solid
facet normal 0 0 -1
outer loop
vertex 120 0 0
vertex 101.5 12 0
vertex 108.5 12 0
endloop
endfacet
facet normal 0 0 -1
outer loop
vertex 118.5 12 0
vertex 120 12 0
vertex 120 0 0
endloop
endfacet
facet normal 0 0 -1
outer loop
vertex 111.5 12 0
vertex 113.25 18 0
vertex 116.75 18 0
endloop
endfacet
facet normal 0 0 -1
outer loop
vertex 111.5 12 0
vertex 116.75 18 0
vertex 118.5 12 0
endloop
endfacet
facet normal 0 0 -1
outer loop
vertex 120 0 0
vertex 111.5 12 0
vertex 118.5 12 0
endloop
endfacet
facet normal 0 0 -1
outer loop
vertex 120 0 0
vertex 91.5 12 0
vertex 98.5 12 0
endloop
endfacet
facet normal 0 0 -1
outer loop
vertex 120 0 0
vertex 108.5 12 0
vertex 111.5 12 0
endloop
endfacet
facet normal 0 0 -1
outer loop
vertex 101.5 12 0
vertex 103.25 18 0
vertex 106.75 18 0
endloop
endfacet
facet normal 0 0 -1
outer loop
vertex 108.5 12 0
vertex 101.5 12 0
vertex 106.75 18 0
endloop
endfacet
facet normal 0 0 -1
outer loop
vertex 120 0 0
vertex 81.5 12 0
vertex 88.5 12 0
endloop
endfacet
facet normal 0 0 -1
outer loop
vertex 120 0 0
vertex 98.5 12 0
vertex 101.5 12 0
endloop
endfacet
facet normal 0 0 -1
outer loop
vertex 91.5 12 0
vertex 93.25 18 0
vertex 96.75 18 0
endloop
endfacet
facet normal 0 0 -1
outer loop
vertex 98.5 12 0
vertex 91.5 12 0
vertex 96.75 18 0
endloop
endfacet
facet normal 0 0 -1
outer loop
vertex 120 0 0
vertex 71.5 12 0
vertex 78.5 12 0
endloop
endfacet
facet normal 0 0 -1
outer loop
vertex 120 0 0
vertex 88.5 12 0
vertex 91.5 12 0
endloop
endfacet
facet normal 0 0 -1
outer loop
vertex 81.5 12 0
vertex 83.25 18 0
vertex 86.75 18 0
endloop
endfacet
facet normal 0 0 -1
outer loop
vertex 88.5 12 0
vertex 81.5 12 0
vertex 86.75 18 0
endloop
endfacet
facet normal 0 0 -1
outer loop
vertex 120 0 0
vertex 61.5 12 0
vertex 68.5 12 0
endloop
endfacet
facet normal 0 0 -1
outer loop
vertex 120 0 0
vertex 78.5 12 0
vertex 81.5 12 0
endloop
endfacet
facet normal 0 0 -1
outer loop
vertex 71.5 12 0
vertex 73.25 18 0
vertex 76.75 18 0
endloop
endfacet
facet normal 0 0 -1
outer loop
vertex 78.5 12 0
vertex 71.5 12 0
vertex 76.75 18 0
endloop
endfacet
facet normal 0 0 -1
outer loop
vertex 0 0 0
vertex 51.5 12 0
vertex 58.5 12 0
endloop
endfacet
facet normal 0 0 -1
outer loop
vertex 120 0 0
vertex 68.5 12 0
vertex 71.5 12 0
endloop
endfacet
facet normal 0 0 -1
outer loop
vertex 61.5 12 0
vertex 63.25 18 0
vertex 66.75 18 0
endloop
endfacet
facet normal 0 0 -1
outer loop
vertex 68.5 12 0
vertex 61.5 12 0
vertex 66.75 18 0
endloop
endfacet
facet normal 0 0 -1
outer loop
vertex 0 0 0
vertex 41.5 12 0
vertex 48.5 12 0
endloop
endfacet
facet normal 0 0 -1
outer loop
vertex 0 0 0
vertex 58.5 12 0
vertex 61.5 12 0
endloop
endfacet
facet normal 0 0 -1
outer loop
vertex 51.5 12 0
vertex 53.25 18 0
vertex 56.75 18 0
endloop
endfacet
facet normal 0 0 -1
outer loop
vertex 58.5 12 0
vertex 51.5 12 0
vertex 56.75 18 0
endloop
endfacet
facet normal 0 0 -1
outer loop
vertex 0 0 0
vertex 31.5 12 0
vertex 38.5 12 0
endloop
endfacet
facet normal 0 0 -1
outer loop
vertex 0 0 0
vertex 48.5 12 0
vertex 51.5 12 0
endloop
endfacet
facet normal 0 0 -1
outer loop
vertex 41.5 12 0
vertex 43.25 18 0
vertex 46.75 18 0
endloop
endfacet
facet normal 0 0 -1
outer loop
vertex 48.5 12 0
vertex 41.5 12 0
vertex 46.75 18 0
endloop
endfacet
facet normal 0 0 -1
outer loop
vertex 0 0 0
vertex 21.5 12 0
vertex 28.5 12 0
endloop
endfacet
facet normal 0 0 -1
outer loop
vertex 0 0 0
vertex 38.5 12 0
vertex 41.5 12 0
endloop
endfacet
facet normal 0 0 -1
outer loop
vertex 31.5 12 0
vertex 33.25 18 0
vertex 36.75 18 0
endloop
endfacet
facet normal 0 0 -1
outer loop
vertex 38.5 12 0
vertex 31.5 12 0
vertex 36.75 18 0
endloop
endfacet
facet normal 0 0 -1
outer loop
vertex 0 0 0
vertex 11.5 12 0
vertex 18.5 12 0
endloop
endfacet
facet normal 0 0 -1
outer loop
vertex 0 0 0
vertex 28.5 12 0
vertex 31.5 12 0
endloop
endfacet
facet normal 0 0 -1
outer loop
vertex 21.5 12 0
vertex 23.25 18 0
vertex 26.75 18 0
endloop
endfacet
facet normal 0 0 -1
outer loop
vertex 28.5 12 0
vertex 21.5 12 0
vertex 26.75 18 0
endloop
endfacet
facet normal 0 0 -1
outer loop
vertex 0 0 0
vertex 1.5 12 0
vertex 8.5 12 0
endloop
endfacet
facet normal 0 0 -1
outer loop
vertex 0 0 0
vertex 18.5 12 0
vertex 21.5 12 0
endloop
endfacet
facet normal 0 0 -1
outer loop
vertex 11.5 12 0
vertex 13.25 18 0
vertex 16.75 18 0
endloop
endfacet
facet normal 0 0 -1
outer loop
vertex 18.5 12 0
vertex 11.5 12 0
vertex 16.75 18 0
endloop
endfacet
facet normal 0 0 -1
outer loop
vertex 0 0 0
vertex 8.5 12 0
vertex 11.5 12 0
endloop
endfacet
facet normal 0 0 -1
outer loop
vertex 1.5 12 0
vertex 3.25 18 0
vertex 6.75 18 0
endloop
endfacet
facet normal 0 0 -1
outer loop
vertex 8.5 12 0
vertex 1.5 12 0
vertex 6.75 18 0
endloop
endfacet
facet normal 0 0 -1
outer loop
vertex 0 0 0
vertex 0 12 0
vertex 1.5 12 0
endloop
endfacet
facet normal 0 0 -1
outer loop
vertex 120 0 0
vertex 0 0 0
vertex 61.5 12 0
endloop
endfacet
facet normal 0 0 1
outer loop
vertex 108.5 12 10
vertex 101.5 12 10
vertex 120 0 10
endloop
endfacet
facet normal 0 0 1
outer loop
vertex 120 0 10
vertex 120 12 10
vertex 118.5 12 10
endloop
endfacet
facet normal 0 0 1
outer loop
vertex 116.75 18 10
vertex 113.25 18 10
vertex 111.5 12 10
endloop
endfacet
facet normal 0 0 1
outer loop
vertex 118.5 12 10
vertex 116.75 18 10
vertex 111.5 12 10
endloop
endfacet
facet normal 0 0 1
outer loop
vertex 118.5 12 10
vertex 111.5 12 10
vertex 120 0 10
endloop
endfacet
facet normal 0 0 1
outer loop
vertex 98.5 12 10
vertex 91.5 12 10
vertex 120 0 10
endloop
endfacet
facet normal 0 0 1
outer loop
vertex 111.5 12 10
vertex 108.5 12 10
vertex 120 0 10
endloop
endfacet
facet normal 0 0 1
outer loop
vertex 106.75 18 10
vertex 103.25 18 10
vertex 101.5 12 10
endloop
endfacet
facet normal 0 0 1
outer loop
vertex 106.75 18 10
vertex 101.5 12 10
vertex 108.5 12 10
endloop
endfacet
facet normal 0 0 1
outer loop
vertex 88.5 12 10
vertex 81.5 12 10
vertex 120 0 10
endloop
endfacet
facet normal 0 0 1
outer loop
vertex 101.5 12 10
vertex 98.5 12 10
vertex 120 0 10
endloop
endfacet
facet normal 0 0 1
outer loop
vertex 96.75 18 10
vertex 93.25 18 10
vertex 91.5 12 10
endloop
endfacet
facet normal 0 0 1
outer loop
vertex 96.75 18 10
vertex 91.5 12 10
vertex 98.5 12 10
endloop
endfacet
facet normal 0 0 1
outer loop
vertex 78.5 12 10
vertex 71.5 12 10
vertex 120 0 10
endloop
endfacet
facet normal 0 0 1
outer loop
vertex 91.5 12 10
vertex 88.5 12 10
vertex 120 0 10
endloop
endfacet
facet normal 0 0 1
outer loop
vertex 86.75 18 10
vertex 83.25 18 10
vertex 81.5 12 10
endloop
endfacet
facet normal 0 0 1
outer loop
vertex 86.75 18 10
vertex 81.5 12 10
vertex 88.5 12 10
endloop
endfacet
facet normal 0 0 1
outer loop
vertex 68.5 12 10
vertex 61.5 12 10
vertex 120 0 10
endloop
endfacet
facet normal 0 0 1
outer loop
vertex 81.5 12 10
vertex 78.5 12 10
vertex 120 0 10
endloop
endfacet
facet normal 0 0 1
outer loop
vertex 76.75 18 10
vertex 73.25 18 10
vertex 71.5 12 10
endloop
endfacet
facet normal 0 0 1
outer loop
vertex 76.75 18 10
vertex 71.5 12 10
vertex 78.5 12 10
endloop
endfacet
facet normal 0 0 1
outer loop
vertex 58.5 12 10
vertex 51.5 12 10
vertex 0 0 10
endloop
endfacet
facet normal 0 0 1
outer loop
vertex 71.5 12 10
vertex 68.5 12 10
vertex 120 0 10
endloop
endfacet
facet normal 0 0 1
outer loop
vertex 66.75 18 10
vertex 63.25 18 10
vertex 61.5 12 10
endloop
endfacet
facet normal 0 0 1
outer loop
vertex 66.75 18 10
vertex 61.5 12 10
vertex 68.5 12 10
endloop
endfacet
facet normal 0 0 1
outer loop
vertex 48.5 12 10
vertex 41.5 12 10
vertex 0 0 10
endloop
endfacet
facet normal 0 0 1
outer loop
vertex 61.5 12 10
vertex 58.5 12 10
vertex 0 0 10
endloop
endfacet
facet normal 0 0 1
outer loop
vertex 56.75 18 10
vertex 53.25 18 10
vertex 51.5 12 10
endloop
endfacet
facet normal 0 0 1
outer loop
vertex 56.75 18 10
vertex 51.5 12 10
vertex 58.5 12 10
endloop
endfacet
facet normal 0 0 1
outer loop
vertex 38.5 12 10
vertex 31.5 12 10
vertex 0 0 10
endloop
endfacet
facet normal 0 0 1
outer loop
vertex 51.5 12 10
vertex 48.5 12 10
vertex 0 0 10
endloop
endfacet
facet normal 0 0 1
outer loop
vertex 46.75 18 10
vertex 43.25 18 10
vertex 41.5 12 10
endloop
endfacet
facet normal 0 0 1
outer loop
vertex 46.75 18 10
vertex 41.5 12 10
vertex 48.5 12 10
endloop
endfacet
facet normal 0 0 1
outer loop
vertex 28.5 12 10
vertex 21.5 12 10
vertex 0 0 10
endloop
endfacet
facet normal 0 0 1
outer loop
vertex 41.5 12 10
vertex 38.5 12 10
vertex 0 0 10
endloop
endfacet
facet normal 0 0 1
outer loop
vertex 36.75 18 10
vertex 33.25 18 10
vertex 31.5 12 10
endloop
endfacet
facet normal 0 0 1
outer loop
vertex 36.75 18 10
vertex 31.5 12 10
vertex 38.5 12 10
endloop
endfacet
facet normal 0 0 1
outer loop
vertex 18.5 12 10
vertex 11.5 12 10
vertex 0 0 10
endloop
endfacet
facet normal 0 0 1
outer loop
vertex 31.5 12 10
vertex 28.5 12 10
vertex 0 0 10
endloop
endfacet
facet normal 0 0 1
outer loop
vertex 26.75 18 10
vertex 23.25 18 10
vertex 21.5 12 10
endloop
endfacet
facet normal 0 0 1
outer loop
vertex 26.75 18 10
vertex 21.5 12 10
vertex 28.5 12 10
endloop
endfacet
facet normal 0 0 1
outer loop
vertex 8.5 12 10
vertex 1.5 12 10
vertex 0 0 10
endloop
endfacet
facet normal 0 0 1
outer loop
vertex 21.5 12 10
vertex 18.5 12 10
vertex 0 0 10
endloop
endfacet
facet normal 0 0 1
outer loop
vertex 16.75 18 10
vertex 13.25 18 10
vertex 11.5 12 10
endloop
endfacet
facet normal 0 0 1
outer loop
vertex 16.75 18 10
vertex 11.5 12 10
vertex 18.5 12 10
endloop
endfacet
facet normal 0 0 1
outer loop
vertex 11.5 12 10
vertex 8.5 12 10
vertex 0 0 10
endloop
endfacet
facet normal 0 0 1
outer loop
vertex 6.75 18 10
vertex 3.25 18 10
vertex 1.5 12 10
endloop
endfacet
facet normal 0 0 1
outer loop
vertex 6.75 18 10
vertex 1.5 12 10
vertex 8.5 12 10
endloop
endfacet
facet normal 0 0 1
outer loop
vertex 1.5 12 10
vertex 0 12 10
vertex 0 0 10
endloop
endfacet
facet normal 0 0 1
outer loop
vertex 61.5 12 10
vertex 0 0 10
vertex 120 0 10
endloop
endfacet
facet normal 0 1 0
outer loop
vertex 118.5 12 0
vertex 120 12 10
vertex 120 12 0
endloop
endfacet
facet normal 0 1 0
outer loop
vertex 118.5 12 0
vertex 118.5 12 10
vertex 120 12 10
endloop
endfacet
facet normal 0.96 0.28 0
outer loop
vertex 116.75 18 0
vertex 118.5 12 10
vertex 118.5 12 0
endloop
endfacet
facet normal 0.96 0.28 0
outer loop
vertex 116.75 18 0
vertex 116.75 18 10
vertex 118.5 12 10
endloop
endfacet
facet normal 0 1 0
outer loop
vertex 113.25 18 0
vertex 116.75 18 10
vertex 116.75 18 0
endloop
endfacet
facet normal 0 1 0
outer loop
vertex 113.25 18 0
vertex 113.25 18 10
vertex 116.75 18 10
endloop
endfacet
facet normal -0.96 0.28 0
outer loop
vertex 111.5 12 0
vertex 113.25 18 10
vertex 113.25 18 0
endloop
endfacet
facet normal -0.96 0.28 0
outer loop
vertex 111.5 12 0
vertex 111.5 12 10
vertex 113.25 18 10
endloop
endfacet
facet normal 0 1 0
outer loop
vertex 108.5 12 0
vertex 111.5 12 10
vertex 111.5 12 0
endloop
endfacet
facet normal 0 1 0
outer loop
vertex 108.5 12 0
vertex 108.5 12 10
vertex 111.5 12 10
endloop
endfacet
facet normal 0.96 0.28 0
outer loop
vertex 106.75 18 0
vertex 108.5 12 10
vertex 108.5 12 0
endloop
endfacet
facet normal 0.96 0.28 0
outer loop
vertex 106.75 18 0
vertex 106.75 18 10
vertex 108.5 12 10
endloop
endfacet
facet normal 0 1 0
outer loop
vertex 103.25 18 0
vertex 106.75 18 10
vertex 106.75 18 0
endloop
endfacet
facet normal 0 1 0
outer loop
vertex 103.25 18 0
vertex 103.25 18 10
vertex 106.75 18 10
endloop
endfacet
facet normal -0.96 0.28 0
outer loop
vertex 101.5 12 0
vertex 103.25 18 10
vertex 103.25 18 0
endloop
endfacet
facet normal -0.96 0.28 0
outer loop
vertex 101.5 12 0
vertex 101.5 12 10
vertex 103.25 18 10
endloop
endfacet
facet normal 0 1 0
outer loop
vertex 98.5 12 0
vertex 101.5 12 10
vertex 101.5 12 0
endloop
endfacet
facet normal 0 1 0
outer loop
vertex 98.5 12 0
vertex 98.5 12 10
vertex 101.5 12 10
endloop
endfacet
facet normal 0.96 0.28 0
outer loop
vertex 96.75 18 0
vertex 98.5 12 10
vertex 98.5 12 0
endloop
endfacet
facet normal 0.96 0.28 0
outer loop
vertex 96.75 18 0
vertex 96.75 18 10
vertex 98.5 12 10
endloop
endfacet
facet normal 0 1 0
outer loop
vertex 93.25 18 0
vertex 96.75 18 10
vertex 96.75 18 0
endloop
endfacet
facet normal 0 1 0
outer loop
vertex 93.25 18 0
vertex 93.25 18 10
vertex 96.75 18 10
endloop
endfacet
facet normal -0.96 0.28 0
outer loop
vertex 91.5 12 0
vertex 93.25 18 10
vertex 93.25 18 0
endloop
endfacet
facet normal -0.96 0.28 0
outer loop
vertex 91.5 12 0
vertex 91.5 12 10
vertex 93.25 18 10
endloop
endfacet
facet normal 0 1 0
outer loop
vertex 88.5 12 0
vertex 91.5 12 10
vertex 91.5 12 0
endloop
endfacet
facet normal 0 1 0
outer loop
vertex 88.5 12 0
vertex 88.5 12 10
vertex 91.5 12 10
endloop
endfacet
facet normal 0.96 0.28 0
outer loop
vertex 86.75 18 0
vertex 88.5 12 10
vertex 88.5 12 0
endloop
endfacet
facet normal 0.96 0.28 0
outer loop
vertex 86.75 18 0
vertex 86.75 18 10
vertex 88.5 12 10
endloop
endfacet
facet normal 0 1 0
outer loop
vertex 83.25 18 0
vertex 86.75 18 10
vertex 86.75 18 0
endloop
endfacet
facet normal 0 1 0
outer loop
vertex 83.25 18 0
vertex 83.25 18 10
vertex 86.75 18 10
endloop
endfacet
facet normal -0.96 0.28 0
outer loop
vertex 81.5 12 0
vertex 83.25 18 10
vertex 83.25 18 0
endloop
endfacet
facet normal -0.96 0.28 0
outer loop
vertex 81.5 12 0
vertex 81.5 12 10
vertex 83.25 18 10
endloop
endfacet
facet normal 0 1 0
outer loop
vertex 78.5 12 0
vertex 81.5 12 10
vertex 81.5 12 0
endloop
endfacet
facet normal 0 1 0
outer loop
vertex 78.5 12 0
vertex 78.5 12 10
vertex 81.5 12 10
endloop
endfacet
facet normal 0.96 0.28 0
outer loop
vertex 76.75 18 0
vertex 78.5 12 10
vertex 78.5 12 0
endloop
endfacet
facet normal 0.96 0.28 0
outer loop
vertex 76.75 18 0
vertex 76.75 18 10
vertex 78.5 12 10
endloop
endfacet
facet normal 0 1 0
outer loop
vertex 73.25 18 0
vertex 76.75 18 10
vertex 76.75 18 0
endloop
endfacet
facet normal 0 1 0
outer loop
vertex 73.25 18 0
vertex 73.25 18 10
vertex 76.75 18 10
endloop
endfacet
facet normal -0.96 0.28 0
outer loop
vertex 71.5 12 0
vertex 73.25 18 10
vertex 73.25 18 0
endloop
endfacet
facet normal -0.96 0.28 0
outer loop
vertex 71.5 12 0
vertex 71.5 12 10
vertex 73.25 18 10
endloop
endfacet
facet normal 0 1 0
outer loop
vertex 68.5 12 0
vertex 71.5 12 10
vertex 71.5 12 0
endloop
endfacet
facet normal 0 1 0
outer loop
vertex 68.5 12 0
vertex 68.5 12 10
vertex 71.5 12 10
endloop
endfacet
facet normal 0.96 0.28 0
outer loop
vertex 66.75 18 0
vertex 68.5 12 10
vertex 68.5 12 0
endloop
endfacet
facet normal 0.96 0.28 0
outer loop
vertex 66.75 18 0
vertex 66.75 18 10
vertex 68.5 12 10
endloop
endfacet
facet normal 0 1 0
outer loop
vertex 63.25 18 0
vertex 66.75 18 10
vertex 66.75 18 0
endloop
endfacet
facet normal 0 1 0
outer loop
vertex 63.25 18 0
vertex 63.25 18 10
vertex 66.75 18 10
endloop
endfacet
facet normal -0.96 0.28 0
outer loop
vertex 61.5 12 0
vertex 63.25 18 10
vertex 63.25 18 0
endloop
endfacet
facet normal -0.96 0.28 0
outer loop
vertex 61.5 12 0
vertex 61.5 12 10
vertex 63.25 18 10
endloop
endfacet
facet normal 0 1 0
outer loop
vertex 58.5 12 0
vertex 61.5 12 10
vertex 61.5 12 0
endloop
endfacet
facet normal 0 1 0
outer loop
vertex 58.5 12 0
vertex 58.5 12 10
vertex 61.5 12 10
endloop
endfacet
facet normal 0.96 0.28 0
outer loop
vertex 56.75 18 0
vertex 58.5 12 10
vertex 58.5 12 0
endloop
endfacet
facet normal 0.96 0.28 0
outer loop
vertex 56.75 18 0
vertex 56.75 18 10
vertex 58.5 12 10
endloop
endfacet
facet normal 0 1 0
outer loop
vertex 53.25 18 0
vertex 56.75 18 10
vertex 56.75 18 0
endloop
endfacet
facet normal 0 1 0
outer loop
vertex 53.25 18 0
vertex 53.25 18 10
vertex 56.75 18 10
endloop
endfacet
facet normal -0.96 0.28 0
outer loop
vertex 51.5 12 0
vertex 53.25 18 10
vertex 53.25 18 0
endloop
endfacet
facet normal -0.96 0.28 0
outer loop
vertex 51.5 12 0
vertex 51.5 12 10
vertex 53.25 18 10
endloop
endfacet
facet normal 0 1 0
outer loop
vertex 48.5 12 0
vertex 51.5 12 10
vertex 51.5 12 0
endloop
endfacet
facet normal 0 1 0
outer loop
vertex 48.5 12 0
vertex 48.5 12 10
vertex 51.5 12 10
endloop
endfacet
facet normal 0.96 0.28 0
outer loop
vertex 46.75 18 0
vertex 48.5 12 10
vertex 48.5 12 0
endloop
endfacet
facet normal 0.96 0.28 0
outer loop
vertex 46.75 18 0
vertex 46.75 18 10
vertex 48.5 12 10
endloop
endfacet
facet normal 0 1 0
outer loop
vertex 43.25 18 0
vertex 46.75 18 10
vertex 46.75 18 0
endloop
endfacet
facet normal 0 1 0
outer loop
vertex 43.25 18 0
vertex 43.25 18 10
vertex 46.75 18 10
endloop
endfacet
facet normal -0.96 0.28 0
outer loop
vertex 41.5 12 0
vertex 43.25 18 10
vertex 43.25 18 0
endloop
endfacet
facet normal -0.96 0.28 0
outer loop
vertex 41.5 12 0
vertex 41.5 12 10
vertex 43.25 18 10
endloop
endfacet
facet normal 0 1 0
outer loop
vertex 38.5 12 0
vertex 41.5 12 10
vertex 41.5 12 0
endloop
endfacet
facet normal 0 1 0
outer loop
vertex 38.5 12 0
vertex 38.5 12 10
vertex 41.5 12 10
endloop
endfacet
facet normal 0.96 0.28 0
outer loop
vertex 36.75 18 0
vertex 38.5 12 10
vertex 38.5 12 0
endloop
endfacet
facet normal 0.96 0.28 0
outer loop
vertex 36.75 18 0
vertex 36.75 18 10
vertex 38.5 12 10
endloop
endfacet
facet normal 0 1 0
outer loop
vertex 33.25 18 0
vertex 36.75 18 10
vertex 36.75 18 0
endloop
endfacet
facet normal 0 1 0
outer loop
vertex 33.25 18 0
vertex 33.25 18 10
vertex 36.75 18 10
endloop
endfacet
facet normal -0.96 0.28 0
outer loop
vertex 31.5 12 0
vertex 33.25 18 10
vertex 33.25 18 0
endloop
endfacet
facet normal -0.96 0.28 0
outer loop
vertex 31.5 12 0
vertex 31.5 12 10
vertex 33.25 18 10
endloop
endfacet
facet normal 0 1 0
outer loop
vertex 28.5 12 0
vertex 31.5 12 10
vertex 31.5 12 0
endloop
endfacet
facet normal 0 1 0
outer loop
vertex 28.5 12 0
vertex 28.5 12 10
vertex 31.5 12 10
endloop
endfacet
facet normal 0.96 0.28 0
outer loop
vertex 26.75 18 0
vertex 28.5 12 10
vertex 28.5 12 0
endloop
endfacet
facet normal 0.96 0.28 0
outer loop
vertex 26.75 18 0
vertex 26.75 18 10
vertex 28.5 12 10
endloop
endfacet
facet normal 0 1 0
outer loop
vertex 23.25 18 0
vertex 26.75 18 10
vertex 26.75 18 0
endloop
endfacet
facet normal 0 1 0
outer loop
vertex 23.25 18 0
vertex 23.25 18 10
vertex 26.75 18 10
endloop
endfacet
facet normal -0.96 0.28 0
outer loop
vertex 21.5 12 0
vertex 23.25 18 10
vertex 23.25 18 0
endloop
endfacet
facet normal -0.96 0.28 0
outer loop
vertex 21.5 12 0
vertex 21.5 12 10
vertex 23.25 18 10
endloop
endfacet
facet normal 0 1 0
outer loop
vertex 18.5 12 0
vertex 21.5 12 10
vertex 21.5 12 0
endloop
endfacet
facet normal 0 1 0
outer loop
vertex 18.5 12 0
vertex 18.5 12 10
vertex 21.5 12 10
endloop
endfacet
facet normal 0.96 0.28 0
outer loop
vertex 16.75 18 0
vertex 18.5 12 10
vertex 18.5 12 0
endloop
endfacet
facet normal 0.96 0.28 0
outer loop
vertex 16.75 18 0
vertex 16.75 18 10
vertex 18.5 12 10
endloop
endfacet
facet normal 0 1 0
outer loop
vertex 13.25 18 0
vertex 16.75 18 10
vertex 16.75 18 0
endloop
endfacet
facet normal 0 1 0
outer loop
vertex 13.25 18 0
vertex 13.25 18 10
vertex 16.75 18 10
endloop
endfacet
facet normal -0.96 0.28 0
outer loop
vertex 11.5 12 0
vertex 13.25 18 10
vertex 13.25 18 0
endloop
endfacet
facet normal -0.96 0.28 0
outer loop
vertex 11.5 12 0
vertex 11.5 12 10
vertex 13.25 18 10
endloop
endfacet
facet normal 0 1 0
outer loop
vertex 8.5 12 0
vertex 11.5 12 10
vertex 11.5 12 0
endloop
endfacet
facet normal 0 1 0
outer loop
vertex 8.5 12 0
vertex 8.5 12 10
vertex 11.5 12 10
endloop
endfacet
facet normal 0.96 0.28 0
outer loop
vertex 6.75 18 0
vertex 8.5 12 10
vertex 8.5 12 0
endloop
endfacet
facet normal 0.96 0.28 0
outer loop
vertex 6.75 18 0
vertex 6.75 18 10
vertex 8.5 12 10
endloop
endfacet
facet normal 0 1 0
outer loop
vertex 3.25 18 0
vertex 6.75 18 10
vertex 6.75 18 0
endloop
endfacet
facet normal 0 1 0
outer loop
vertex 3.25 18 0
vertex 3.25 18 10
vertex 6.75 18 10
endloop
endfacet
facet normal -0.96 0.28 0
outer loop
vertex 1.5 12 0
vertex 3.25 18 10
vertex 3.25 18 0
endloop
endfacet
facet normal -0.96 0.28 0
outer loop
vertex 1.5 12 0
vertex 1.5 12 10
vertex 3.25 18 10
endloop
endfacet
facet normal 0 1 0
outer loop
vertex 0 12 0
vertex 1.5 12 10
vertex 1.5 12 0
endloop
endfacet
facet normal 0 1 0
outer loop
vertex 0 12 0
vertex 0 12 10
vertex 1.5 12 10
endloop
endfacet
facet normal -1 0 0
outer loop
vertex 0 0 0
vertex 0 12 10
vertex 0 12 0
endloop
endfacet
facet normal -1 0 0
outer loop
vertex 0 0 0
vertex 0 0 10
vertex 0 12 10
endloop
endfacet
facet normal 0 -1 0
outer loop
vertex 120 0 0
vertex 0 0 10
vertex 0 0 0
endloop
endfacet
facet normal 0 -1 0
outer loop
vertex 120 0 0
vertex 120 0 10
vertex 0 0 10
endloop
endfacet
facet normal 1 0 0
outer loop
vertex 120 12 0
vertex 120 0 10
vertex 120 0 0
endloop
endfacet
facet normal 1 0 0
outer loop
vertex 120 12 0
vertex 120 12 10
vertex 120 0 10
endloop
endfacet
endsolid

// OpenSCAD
$fn = 32;

// ----------------------------------------------------------------------
// Gear rack: 12 teeth, pitch 10 mm
// ----------------------------------------------------------------------

// --- parameters (mm) ---
teeth = 12;               // number of teeth
pitch = 10;               // tooth pitch, X
root_w = 7;               // tooth width at the root
tip_w = 3.5;              // tooth width at the tip
base_h = 12;              // rack body height, Y
tooth_h = 6;              // tooth height above the body
plate_t = 10;             // rack width, Z (extrusion height)

rack_l = teeth * pitch;  // overall length
total_h = base_h + tooth_h;  // overall height

profile = [[0, 0], [120, 0], [120, 12], [118.5, 12], [116.75, 18], [113.25, 18], [111.5, 12], [108.5, 12], [106.75, 18], [103.25, 18], [101.5, 12], [98.5, 12], [96.75, 18], [93.25, 18], [91.5, 12], [88.5, 12], [86.75, 18], [83.25, 18], [81.5, 12], [78.5, 12], [76.75, 18], [73.25, 18], [71.5, 12], [68.5, 12], [66.75, 18], [63.25, 18], [61.5, 12], [58.5, 12], [56.75, 18], [53.25, 18], [51.5, 12], [48.5, 12], [46.75, 18], [43.25, 18], [41.5, 12], [38.5, 12], [36.75, 18], [33.25, 18], [31.5, 12], [28.5, 12], [26.75, 18], [23.25, 18], [21.5, 12], [18.5, 12], [16.75, 18], [13.25, 18], [11.5, 12], [8.5, 12], [6.75, 18], [3.25, 18], [1.5, 12], [0, 12]];  // primary outline, 52 points, counter clockwise

// --- the one profile operation ---
linear_extrude(height = plate_t) polygon(points = profile);
